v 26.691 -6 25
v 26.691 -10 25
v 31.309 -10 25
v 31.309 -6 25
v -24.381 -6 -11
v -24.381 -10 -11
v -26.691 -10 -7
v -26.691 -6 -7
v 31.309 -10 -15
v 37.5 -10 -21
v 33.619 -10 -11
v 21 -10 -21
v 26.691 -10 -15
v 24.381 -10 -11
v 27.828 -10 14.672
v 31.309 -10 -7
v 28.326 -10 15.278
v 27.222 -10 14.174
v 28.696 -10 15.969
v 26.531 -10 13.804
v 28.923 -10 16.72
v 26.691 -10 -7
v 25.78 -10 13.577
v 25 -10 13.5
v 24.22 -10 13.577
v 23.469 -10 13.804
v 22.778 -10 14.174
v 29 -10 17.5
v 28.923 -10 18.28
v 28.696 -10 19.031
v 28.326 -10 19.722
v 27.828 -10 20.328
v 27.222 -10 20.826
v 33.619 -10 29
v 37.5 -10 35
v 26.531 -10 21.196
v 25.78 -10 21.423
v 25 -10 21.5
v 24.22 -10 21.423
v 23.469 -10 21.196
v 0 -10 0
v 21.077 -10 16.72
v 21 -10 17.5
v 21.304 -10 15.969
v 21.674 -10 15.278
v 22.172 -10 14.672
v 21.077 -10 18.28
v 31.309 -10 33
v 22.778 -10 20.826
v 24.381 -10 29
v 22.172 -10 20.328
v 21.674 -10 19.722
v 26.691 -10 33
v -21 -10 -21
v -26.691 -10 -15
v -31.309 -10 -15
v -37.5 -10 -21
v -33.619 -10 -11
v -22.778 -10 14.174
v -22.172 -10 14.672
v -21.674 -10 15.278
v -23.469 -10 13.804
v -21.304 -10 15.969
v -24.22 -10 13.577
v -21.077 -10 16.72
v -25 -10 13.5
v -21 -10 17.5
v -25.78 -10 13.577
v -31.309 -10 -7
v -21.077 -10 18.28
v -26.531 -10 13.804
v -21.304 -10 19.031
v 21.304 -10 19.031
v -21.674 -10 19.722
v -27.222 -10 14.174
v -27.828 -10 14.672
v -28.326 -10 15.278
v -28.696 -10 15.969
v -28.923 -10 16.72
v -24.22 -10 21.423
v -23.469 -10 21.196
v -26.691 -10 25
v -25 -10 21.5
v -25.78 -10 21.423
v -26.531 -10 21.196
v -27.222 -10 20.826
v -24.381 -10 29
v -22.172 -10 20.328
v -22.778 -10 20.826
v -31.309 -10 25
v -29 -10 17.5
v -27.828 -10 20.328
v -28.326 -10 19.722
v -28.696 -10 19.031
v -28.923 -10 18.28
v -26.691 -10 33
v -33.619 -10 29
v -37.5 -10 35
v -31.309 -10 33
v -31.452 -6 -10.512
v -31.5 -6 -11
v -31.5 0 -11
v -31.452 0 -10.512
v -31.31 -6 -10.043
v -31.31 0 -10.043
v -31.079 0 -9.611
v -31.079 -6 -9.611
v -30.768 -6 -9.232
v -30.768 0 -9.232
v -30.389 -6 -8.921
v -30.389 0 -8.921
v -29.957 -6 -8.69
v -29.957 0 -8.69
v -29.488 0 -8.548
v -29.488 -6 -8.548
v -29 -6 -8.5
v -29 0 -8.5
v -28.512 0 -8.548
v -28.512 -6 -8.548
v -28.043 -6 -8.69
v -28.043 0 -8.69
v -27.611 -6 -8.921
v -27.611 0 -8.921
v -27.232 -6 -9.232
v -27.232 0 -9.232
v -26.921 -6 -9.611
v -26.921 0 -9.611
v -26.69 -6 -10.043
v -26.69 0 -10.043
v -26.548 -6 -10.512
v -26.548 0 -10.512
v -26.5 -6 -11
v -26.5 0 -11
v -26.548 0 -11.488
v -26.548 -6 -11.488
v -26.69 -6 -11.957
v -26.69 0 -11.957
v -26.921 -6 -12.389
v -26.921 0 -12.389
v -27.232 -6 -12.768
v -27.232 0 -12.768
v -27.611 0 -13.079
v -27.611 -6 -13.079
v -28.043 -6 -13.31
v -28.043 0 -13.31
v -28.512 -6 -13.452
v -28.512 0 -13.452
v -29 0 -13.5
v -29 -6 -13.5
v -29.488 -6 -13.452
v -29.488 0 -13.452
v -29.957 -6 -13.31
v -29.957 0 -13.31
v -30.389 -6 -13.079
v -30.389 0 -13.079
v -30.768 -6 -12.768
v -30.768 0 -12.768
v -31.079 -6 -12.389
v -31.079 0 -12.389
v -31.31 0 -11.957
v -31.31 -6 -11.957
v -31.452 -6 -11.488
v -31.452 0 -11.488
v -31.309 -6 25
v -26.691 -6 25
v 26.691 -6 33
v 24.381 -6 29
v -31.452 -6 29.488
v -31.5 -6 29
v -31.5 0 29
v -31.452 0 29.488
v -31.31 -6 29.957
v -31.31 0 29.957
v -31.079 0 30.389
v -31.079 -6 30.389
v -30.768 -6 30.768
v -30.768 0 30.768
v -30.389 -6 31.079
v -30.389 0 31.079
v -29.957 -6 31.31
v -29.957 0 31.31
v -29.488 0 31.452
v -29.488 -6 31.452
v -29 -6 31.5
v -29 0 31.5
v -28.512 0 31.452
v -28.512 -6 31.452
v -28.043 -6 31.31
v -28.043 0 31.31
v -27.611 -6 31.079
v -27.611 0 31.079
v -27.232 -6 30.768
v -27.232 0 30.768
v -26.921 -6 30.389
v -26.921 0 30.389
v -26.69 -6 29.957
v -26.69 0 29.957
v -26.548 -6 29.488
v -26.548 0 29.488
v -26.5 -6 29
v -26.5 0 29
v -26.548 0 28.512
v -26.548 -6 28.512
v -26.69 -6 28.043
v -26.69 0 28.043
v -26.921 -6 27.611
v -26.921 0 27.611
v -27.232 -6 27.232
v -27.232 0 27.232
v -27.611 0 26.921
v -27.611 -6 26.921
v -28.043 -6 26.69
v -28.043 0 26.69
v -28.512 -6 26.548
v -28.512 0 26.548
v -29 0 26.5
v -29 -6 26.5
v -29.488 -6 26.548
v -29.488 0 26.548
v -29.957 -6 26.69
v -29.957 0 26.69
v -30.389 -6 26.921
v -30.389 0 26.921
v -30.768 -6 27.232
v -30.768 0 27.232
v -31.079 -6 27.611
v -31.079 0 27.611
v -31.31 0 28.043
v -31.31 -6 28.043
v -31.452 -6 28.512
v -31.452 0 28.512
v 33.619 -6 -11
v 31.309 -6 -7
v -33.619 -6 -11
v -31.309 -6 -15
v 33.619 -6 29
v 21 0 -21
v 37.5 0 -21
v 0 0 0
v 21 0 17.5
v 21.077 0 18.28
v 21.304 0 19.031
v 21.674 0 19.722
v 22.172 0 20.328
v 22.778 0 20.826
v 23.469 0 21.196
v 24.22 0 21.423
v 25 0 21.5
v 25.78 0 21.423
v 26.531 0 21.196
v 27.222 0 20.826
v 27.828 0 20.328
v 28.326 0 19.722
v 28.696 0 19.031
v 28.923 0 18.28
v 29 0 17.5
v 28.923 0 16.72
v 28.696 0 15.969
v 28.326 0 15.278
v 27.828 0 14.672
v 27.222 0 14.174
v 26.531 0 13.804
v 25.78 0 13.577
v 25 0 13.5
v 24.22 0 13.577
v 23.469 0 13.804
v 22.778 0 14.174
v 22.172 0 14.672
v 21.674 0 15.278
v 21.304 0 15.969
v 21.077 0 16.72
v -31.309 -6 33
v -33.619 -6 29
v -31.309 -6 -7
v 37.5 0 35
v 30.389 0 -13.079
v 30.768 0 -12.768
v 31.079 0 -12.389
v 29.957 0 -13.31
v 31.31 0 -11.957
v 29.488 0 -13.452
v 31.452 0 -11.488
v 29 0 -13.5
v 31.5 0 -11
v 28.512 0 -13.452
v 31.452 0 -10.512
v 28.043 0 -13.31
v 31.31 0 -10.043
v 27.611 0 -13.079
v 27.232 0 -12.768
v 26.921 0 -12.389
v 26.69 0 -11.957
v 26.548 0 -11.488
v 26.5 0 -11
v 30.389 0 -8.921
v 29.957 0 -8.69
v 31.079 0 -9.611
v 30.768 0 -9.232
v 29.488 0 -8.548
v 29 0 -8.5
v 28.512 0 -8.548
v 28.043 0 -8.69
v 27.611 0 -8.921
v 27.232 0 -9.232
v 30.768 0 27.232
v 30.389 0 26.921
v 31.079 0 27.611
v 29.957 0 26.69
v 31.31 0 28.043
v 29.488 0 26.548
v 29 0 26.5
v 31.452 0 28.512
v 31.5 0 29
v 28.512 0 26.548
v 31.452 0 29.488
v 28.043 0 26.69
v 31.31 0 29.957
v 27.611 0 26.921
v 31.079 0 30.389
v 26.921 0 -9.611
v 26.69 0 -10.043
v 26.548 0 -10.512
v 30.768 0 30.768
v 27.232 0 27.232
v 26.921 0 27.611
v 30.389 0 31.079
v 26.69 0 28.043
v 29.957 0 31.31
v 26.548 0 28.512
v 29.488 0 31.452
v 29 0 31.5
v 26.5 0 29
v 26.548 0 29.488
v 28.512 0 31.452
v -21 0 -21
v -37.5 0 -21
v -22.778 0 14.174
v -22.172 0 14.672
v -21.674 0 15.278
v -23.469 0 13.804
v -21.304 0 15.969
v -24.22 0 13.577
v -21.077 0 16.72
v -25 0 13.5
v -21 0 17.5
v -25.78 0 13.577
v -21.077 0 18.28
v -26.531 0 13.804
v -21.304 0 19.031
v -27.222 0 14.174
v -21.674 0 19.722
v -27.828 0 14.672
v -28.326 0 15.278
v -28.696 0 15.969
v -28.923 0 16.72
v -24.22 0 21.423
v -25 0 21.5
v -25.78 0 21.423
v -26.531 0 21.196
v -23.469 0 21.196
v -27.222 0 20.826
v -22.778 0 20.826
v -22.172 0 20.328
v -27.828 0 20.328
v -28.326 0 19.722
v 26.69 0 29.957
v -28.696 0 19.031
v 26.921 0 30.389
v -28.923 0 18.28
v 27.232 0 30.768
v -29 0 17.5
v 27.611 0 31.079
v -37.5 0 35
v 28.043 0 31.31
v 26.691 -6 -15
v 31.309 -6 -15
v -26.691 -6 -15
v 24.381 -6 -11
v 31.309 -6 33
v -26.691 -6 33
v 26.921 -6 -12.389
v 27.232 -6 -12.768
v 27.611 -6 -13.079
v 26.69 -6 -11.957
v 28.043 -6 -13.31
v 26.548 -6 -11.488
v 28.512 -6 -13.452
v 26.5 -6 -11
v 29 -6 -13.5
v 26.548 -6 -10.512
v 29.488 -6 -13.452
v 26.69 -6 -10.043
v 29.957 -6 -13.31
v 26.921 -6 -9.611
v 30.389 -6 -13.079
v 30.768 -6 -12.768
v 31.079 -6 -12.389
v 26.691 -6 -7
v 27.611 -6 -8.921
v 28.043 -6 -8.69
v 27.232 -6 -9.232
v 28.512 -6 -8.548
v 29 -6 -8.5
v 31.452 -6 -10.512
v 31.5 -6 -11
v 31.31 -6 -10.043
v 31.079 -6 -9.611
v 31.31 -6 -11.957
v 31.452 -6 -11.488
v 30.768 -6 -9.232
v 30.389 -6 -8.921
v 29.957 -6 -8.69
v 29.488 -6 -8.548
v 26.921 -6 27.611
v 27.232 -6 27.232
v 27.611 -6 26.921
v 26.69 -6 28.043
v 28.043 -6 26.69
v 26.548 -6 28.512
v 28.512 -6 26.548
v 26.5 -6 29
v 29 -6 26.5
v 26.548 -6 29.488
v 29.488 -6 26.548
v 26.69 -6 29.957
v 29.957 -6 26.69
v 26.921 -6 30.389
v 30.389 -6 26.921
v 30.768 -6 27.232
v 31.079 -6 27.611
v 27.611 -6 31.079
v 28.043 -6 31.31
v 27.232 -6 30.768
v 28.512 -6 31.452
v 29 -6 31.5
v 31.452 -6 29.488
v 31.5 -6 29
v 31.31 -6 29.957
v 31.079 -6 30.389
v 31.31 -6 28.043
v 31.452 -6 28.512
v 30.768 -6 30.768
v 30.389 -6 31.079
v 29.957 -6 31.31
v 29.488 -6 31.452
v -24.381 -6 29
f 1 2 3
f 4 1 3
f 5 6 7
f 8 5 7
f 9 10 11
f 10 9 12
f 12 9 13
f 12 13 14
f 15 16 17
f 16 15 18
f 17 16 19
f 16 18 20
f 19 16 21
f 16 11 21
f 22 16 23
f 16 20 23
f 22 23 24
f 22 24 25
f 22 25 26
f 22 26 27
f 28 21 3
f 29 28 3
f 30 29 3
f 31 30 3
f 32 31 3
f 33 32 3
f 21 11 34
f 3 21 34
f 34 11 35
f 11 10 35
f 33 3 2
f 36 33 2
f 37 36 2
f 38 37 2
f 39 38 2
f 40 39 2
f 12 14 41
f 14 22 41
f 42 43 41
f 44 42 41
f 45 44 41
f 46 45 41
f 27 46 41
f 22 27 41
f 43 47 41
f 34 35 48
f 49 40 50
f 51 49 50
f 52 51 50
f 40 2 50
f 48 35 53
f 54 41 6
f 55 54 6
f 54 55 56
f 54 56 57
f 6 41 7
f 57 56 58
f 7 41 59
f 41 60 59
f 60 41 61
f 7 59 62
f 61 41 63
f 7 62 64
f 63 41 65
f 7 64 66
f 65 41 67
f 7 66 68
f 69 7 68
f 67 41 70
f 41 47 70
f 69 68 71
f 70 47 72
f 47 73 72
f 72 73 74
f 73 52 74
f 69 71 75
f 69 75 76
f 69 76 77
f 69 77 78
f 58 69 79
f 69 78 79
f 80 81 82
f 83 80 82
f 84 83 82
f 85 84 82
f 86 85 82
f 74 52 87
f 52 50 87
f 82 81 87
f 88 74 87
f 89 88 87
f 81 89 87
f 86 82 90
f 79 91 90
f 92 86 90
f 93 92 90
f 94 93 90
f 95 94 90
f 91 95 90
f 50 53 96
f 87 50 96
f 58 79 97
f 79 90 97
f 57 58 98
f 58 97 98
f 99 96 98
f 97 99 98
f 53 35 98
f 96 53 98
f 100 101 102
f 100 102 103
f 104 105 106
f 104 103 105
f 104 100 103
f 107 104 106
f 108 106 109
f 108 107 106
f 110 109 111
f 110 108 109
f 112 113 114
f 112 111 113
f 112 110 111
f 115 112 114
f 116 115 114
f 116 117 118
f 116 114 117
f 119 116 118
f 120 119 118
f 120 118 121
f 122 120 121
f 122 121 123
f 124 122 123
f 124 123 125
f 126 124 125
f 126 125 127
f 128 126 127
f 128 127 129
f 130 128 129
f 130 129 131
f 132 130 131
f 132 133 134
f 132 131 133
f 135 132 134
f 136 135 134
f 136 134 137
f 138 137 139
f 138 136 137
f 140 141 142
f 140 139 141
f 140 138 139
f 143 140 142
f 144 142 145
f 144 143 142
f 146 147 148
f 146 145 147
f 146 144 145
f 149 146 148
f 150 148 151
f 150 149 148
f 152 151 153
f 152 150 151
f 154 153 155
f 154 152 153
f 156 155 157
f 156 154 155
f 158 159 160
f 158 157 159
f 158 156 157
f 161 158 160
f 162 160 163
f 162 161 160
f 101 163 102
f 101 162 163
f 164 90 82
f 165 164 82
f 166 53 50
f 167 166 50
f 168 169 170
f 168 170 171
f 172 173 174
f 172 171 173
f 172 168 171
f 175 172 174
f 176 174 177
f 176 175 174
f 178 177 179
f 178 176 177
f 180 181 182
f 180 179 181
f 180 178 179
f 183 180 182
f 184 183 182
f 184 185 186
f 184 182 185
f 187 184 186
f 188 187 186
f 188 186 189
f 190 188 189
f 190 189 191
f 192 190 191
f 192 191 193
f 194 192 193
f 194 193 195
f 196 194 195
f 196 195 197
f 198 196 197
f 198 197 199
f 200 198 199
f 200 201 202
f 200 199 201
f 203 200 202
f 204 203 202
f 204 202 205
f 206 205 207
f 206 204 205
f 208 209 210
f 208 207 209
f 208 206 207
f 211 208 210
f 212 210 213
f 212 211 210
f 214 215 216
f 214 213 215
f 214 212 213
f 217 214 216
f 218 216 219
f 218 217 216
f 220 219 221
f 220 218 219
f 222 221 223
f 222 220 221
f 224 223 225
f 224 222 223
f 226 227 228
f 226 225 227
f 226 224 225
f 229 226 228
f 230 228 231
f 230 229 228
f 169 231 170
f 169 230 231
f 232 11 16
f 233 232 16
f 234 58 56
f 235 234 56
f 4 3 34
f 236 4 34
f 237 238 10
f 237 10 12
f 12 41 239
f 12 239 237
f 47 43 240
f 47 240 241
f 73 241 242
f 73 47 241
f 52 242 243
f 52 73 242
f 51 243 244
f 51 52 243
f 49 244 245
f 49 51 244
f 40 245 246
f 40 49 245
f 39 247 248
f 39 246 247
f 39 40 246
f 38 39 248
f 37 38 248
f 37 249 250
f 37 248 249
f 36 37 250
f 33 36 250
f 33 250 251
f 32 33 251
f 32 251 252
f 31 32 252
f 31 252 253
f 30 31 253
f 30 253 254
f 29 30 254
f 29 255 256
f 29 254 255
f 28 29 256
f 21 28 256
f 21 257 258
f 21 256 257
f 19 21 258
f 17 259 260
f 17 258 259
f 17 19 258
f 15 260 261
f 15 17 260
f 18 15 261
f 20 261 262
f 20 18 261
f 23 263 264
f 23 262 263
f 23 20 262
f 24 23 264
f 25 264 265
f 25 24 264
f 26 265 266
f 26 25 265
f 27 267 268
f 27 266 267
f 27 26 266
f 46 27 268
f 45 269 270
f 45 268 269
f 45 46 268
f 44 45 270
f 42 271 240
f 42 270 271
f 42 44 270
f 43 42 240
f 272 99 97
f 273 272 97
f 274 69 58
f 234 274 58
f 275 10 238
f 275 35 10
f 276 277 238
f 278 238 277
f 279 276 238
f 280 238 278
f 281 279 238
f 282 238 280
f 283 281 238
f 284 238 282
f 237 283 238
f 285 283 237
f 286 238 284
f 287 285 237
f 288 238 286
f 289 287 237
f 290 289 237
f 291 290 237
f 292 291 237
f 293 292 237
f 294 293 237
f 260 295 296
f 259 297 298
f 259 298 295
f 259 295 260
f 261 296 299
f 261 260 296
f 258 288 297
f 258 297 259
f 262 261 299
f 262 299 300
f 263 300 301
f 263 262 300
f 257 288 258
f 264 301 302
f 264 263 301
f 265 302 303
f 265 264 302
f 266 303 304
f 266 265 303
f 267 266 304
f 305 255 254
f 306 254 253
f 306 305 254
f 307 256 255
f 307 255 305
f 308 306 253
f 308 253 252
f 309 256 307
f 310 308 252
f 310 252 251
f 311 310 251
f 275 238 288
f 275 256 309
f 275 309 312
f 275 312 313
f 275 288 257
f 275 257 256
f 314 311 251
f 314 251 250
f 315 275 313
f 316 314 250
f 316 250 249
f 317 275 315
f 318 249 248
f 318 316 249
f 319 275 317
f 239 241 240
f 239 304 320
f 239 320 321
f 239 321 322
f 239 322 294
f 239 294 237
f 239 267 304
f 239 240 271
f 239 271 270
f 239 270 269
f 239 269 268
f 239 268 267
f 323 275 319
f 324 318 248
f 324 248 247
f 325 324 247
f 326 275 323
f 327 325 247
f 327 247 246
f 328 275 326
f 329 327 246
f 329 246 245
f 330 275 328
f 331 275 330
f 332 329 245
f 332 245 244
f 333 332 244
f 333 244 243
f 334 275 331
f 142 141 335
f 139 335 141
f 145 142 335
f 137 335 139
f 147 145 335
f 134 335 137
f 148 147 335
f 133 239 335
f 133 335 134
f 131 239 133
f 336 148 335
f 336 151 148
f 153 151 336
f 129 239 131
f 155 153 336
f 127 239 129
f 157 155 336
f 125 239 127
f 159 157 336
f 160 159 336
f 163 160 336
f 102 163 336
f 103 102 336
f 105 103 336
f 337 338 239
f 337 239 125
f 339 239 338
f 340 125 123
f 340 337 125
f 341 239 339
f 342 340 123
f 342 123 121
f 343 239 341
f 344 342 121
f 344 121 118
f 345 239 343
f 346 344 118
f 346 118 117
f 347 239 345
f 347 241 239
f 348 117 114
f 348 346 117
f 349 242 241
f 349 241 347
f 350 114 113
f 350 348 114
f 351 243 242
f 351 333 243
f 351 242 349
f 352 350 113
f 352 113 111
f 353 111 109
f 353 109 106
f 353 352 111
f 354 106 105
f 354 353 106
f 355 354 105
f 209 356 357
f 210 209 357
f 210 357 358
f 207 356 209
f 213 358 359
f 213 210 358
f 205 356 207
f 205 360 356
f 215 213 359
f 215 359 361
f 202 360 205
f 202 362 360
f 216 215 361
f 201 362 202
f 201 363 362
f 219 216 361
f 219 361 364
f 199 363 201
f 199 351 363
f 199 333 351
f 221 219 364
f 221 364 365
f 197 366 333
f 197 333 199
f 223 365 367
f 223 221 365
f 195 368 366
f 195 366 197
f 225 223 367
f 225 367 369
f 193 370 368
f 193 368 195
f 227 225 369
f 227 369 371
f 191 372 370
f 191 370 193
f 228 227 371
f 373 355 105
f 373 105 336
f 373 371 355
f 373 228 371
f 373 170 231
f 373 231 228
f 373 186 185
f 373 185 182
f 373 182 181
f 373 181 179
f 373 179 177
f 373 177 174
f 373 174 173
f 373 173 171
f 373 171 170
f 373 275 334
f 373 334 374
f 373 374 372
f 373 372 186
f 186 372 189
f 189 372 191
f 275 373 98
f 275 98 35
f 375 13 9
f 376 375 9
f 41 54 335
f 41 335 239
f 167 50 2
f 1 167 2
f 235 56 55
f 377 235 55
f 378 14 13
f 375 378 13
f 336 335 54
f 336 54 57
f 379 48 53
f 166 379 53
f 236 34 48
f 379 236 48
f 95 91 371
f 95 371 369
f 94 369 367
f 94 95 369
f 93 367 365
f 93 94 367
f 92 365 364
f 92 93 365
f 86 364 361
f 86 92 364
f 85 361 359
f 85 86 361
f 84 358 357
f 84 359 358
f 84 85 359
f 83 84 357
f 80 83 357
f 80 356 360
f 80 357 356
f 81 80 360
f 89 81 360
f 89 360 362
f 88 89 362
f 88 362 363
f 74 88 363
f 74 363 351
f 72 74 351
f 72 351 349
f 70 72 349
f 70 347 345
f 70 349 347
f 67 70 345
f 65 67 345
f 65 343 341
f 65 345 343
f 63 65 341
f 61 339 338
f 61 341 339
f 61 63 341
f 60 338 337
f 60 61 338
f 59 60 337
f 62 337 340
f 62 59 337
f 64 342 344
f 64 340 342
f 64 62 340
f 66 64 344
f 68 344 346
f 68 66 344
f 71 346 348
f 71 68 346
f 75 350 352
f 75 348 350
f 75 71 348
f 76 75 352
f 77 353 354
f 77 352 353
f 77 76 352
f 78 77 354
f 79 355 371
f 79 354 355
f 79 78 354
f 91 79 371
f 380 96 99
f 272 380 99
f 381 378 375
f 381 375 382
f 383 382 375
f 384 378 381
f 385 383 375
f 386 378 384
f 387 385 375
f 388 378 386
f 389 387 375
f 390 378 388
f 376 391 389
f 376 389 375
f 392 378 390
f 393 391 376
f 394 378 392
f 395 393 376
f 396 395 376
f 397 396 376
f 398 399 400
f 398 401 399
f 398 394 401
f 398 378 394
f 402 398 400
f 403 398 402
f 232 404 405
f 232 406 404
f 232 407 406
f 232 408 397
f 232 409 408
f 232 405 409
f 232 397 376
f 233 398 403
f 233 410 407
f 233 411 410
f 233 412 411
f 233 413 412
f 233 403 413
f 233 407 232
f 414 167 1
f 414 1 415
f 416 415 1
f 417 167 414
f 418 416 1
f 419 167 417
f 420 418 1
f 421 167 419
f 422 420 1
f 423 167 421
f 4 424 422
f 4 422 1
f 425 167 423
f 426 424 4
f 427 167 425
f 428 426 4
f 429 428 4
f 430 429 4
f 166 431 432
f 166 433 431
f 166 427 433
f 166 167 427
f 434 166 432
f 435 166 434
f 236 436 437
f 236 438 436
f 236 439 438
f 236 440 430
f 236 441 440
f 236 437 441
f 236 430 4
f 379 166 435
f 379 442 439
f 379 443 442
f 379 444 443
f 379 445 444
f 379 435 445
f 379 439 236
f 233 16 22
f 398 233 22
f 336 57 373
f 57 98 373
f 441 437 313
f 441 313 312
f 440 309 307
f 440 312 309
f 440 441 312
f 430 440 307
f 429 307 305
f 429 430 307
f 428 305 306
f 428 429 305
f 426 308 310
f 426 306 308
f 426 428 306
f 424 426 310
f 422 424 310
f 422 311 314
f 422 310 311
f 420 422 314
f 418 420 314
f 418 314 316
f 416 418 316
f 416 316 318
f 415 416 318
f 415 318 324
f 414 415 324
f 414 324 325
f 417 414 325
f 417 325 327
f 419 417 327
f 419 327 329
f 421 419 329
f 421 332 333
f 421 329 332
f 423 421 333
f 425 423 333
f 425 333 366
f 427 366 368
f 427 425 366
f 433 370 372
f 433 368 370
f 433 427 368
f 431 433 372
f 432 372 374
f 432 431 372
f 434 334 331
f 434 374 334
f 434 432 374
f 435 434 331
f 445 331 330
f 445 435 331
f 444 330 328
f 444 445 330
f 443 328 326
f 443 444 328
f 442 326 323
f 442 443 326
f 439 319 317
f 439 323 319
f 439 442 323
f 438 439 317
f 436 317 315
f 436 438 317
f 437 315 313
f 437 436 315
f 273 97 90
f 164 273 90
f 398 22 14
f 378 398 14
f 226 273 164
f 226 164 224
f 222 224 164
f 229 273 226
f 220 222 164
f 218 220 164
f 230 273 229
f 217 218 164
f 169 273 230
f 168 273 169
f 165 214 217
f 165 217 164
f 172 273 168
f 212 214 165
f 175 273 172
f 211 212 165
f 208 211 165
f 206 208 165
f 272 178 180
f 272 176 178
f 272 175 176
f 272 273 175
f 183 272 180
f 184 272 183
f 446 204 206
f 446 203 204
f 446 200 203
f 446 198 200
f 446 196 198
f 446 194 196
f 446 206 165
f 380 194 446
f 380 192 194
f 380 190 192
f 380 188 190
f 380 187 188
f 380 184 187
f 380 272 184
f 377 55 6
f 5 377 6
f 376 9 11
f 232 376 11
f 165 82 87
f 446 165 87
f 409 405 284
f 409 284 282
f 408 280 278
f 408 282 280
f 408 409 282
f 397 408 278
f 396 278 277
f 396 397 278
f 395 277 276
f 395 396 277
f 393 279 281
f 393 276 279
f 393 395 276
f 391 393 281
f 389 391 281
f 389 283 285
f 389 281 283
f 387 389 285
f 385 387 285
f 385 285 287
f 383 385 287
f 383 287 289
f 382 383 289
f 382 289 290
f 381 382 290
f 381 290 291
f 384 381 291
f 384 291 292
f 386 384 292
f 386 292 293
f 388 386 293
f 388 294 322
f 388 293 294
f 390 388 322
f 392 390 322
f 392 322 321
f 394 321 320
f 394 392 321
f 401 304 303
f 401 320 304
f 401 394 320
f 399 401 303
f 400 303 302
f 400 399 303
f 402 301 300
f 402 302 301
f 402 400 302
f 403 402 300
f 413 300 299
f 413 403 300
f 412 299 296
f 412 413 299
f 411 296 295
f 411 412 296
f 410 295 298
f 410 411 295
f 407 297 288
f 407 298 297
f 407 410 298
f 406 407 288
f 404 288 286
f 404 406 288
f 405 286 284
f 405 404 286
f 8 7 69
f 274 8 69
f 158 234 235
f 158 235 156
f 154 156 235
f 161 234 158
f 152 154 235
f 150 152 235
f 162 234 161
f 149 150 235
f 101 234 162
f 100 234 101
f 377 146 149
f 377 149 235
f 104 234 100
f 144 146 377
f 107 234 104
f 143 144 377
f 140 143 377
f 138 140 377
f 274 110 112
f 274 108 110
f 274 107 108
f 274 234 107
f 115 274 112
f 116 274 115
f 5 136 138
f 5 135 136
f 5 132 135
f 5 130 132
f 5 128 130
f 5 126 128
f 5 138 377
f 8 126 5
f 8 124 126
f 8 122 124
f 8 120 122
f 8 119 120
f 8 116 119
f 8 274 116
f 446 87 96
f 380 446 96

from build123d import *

# Parameters (mm, degrees)
SKETCH1_W               = 75
SKETCH1_H               = 10
BOSS_EXTRUDE1_DEPTH     = 35
CUT_EXTRUDE1_DEPTH      = 53.261362401
CUT_EXTRUDE1_DEPTH_BACK = 53.261362401
SKETCH2_R               = 4
CUT_EXTRUDE2_DEPTH      = 53.261362401
CUT_EXTRUDE2_DEPTH_BACK = 53.261362401
SKETCH3_R               = 2.5
SKETCH4_W               = 75
SKETCH4_H               = 10
BOSS_EXTRUDE2_DEPTH     = 21
CUT_EXTRUDE3_DEPTH      = 53.261362401
CUT_EXTRUDE3_DEPTH_BACK = 53.261362401
SKETCH5_R               = 2.5
CUT_EXTRUDE4_DEPTH      = 4
CUT_EXTRUDE5_DEPTH      = 53.261362401
CUT_EXTRUDE5_DEPTH_BACK = 53.261362401


with BuildPart() as part:
    # Sketch1 → Boss-Extrude1 (new body)
    with BuildSketch(Plane.XY):
        with Locations((0, -5)):
            Rectangle(SKETCH1_W, SKETCH1_H)
    extrude(amount=BOSS_EXTRUDE1_DEPTH)

    # Sketch2 → Cut-Extrude1 (cut, two sides: drawn at the far end of the back side and taken through both)
    with BuildSketch(Plane(origin=(0, 0, 0), x_dir=(1, 0, 0), z_dir=(0, 1, 0)).offset(-CUT_EXTRUDE1_DEPTH_BACK)):
        with Locations(Location((-25, -17.5, 0), (0, 0, 180))):
            Circle(SKETCH2_R)
        with Locations(Location((25, -17.5, 0), (0, 0, 180))):
            Circle(SKETCH2_R)
    extrude(amount=CUT_EXTRUDE1_DEPTH + CUT_EXTRUDE1_DEPTH_BACK, mode=Mode.SUBTRACT)

    # Sketch3 → Cut-Extrude2 (cut, two sides: drawn at the far end of the back side and taken through both)
    with BuildSketch(Plane(origin=(0, 0, 0), x_dir=(1, 0, 0), z_dir=(0, 1, 0)).offset(-CUT_EXTRUDE2_DEPTH_BACK)):
        with Locations(Location((-29, -29, 0), (0, 0, 180))):
            Circle(SKETCH3_R)
        with Locations((29, -29)):
            Circle(SKETCH3_R)
    extrude(amount=CUT_EXTRUDE2_DEPTH + CUT_EXTRUDE2_DEPTH_BACK, mode=Mode.SUBTRACT)

    # Sketch4 → Boss-Extrude2 (add)
    with BuildSketch(Plane(origin=(0, 0, 0), x_dir=(-1, 0, 0), z_dir=(0, 0, -1))):
        with Locations((0, -5)):
            Rectangle(SKETCH4_W, SKETCH4_H)
    extrude(amount=BOSS_EXTRUDE2_DEPTH)

    # Sketch5 → Cut-Extrude3 (cut, two sides: drawn at the far end of the back side and taken through both)
    with BuildSketch(Plane(origin=(0, 0, 0), x_dir=(1, 0, 0), z_dir=(0, 1, 0)).offset(-CUT_EXTRUDE3_DEPTH_BACK)):
        with Locations(Location((-29, 11, 0), (0, 0, 180))):
            Circle(SKETCH5_R)
        with Locations((29, 11)):
            Circle(SKETCH5_R)
    extrude(amount=CUT_EXTRUDE3_DEPTH + CUT_EXTRUDE3_DEPTH_BACK, mode=Mode.SUBTRACT)

    # Sketch6 → Cut-Extrude4 (cut)
    with BuildSketch(Plane.XZ.offset(10)):
        Polygon((-24.381197846, 29), (-26.690598923, 33), (-31.309401077, 33), (-33.618802154, 29), (-31.309401077, 25), (-26.690598923, 25), align=None)
        Polygon((33.618802154, 29), (31.309401077, 33), (26.690598923, 33), (24.381197846, 29), (26.690598923, 25), (31.309401077, 25), align=None)
        Polygon((-24.381197846, -11), (-26.690598923, -7), (-31.309401077, -7), (-33.618802154, -11), (-31.309401077, -15), (-26.690598923, -15), align=None)
        Polygon((33.618802154, -11), (31.309401077, -7), (26.690598923, -7), (24.381197846, -11), (26.690598923, -15), (31.309401077, -15), align=None)
    extrude(amount=-CUT_EXTRUDE4_DEPTH, mode=Mode.SUBTRACT)

    # Sketch7 → Cut-Extrude5 (cut, two sides: drawn at the far end of the back side and taken through both)
    with BuildSketch(Plane(origin=(0, 0, 0), x_dir=(1, 0, 0), z_dir=(0, 1, 0)).offset(-CUT_EXTRUDE5_DEPTH_BACK)):
        Polygon((0, 0), (21, 21), (-21, 21), align=None)
    extrude(amount=CUT_EXTRUDE5_DEPTH + CUT_EXTRUDE5_DEPTH_BACK, mode=Mode.SUBTRACT)


solid = part.part
